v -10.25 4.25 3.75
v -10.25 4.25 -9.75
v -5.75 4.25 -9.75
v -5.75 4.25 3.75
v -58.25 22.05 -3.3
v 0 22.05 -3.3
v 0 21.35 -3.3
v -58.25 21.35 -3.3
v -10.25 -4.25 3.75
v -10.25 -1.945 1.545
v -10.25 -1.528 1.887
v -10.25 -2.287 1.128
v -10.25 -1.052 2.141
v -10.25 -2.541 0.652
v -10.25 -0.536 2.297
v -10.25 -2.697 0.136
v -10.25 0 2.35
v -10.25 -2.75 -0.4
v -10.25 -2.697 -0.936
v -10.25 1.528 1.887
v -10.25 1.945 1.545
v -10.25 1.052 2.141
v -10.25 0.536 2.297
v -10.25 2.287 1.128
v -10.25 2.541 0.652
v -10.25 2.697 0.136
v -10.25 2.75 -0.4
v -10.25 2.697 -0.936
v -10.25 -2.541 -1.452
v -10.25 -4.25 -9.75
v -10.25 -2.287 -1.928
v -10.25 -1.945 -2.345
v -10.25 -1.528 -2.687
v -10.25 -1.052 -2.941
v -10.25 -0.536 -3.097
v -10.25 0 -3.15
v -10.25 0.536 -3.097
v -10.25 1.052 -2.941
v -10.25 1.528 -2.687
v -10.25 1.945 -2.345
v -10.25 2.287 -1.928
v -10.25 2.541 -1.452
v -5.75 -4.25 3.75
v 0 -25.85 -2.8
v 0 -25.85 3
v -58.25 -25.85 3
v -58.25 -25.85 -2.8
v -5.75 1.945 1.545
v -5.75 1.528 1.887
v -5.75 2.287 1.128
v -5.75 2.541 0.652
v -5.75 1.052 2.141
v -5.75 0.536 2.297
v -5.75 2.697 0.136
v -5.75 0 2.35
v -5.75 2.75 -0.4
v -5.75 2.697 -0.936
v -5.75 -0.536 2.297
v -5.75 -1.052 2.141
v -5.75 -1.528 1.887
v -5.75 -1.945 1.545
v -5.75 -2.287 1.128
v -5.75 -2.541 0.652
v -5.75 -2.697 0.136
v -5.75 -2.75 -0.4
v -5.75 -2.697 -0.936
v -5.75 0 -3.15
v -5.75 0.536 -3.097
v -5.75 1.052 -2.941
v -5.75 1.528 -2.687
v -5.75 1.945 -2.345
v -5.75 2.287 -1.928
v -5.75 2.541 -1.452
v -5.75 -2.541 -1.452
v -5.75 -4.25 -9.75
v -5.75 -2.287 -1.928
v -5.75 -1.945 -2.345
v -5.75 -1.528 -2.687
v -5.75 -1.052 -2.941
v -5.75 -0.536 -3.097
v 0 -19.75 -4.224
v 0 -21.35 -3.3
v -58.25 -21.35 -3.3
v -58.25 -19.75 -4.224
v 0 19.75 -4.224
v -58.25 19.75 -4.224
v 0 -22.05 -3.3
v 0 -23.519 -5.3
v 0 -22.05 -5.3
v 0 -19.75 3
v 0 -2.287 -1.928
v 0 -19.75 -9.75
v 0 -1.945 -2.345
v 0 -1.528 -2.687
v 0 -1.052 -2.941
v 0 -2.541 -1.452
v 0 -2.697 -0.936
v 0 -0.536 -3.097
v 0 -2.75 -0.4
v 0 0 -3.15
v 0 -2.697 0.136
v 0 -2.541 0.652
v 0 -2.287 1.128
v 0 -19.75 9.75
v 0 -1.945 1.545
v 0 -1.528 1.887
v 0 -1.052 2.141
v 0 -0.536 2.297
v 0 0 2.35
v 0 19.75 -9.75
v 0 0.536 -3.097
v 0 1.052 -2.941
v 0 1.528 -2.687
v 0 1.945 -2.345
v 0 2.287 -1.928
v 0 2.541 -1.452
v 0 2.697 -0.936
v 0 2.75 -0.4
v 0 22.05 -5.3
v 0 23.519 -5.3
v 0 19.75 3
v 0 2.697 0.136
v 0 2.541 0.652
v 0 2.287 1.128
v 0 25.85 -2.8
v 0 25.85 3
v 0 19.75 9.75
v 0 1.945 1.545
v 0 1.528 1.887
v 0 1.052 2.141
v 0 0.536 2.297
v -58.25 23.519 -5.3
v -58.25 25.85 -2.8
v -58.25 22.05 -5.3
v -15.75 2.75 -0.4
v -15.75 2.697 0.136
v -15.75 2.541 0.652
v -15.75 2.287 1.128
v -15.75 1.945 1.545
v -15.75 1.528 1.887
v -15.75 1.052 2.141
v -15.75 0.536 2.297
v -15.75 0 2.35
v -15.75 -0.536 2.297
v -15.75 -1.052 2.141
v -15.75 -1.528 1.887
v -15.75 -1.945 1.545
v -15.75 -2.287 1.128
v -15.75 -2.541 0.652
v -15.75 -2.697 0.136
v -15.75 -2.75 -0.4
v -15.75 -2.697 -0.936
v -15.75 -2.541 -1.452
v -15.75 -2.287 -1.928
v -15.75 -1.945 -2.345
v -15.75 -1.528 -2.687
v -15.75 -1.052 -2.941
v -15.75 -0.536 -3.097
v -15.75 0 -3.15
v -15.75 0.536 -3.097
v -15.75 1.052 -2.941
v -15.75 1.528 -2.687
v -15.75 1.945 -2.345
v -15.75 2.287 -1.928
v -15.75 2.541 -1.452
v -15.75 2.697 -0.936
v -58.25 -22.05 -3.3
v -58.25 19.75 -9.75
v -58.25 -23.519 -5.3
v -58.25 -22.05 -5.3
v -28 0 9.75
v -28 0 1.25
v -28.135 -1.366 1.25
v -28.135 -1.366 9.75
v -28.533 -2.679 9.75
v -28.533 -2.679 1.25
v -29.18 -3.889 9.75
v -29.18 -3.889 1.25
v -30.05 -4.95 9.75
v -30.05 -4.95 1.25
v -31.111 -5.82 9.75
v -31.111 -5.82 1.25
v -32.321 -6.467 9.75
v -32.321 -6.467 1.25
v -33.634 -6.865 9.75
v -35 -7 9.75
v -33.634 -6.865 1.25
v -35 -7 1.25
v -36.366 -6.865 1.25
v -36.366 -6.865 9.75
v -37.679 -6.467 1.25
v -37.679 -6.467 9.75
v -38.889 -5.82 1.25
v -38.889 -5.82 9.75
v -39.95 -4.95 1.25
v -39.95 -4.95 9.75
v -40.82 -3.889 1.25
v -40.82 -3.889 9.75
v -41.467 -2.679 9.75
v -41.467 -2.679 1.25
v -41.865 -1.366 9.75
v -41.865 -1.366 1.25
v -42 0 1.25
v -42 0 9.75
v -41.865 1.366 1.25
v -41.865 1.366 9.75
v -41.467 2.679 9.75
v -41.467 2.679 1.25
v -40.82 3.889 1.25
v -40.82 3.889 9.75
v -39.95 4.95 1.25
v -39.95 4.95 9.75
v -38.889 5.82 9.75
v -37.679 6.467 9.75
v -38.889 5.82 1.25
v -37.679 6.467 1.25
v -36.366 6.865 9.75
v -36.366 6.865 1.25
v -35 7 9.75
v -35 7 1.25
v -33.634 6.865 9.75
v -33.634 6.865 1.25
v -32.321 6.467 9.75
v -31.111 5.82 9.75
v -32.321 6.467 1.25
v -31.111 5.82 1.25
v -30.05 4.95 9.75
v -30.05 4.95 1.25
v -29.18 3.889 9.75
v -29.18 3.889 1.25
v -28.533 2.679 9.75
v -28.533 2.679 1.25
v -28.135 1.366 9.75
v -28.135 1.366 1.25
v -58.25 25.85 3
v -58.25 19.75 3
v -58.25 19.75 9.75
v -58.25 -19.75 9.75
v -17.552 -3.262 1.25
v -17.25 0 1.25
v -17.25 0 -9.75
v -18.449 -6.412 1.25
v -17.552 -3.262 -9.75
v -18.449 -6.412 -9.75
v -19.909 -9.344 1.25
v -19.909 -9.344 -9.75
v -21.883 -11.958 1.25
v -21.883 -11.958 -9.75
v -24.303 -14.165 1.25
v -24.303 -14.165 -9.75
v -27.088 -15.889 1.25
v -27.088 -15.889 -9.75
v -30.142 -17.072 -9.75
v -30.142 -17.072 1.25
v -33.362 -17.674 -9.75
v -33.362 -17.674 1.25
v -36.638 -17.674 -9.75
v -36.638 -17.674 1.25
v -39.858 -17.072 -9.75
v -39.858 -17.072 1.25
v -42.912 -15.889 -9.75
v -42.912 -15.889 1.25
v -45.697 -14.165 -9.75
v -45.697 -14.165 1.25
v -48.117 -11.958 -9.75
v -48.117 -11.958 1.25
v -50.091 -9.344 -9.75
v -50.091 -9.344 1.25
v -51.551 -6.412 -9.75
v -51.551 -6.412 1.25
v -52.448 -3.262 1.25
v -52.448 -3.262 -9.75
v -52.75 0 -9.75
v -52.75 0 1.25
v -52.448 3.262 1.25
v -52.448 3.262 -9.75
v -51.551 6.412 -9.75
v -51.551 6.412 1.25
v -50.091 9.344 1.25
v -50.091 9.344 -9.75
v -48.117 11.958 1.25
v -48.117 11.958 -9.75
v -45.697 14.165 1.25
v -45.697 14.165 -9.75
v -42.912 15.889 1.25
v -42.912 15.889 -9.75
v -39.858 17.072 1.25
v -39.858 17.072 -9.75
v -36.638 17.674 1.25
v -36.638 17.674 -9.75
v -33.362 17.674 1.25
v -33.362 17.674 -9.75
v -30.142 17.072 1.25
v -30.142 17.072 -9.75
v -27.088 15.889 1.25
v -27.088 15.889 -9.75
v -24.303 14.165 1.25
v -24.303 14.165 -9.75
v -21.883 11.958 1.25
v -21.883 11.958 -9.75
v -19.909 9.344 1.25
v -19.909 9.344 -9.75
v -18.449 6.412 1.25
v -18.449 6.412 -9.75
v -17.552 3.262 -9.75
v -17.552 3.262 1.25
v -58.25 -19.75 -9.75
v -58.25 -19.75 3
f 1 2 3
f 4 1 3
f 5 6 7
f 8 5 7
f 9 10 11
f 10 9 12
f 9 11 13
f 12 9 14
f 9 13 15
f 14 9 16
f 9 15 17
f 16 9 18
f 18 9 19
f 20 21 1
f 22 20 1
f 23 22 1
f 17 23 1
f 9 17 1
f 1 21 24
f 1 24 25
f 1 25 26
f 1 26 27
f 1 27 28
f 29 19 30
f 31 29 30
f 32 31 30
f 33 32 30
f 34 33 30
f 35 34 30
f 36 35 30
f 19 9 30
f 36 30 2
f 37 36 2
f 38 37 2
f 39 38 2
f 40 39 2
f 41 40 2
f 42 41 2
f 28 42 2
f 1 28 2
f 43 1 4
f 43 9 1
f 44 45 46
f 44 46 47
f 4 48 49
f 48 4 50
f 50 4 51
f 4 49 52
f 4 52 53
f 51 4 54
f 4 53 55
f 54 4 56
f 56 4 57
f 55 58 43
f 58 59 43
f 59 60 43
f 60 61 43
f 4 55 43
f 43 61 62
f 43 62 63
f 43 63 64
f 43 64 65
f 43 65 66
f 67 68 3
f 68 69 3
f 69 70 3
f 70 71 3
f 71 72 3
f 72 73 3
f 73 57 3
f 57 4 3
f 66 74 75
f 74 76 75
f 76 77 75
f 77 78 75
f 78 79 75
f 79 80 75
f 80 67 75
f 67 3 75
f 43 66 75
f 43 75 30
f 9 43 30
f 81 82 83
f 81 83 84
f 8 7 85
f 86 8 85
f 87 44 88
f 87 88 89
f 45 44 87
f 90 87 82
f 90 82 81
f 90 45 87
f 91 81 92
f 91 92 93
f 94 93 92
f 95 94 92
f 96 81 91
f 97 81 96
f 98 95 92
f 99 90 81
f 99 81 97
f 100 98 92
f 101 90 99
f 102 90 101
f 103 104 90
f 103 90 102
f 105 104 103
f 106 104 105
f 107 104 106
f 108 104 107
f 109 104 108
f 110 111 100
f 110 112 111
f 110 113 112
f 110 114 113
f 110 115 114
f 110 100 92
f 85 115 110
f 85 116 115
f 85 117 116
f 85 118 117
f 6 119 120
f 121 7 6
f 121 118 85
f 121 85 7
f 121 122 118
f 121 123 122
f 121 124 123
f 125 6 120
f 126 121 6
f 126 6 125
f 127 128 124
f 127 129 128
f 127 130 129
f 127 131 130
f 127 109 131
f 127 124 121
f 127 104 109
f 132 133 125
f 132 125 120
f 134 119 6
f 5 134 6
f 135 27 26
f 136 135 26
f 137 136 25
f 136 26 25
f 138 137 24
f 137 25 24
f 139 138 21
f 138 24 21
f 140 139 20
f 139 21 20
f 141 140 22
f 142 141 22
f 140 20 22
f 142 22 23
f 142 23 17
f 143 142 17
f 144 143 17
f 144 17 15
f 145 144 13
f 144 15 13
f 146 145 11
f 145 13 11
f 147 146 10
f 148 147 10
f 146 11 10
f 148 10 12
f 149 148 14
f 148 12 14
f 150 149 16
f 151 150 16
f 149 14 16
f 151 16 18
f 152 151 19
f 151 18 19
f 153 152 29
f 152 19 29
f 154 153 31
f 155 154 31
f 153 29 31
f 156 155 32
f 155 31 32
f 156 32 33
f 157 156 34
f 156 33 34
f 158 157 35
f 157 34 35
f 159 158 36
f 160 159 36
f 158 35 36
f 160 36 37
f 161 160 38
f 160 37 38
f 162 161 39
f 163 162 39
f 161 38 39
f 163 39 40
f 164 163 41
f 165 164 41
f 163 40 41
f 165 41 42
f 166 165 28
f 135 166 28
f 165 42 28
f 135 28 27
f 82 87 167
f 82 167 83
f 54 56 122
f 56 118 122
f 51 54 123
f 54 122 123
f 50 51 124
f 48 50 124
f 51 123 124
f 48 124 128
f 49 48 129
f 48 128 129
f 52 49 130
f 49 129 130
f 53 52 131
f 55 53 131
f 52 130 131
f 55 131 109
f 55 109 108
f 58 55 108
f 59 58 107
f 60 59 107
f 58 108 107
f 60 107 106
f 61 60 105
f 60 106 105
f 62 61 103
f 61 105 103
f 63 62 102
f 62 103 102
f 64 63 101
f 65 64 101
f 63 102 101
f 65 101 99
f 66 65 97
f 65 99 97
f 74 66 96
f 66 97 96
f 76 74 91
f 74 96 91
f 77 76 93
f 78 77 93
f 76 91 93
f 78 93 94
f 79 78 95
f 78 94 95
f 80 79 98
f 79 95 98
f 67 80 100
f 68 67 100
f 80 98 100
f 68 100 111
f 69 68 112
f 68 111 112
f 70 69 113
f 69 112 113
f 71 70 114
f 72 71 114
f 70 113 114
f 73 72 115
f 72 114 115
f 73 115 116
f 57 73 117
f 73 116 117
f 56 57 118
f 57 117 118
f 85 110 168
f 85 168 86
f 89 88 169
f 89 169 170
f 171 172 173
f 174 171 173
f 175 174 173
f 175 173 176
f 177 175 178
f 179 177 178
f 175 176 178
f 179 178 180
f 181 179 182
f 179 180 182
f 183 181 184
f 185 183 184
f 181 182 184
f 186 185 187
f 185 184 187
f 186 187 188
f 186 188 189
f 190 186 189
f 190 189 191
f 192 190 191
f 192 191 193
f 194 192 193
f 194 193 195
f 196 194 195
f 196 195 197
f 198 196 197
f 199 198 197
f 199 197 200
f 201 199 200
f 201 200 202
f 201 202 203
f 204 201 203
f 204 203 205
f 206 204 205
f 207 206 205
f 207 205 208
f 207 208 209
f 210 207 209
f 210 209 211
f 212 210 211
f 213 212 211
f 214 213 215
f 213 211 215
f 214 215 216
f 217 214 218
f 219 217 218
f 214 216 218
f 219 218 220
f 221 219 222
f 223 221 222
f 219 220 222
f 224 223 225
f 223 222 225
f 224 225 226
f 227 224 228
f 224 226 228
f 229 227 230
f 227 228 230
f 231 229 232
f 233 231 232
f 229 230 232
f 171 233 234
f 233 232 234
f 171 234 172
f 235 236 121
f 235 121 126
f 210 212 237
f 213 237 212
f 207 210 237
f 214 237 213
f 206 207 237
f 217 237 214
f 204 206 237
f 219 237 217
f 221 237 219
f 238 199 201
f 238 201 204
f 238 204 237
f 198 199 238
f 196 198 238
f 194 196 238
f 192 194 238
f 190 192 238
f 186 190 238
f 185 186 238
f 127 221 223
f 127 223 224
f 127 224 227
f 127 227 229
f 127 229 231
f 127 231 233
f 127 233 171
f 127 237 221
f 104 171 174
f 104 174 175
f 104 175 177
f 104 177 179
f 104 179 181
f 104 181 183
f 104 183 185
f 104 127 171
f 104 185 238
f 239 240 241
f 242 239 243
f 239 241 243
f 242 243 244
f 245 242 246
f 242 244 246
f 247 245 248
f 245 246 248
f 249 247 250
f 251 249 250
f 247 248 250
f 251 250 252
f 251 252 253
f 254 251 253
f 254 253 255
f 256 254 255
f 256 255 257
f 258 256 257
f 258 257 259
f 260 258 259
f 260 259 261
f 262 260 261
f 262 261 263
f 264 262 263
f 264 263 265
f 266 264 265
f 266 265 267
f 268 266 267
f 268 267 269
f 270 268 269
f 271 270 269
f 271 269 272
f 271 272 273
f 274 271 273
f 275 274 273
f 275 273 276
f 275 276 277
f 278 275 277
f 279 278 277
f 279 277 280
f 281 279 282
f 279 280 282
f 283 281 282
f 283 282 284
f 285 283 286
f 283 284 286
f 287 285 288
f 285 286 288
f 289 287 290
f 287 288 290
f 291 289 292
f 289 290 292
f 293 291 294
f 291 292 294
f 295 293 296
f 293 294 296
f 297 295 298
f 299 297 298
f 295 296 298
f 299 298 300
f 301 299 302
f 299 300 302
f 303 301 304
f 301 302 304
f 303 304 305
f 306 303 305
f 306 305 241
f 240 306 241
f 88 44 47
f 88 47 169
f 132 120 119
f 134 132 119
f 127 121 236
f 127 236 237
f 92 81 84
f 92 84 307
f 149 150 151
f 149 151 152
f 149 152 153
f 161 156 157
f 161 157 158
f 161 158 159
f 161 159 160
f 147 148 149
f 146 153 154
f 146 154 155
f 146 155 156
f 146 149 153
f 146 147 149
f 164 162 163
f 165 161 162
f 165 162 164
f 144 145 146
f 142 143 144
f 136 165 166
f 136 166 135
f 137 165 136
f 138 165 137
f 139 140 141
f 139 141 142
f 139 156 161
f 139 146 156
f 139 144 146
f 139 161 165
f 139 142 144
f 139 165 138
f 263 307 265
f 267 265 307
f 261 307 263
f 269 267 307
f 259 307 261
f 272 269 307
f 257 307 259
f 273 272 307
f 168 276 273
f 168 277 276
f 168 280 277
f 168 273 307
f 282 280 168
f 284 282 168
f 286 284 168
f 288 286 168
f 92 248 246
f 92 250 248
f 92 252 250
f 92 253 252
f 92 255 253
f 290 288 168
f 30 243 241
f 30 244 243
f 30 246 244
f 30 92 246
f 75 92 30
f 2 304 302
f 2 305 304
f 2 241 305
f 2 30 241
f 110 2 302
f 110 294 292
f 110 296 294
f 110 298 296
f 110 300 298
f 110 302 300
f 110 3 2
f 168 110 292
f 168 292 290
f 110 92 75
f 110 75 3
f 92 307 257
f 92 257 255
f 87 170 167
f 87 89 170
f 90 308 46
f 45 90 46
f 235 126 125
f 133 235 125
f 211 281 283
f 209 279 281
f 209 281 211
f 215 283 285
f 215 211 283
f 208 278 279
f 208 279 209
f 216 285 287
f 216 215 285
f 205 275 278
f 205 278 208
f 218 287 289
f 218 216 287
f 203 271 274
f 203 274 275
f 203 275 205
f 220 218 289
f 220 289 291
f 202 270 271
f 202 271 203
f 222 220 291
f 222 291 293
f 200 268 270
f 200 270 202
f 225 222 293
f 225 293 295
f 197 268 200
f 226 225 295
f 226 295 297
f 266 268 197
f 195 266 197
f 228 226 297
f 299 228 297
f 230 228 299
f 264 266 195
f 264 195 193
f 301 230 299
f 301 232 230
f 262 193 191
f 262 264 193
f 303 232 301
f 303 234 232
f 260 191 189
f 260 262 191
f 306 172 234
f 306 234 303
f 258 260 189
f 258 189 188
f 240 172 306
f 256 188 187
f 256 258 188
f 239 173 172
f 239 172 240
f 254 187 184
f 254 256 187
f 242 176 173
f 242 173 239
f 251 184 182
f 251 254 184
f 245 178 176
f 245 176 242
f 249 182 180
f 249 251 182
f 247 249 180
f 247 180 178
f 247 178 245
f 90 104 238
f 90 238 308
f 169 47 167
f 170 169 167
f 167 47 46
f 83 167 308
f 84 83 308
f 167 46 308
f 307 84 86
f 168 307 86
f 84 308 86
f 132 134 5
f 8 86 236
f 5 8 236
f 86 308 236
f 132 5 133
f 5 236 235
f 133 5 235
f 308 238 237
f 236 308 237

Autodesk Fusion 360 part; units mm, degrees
sketch "Main Profile" plane through (0, 0, 0) normal (1, 0, 0) x (0, 1, 0)
  line L0 (-19.75, -9.75) -> (19.75, -9.75)
  line L1 (19.75, -9.75) -> (19.75, 9.75)
  line L2 (19.75, 9.75) -> (-19.75, 9.75)
  line L3 (-19.75, 9.75) -> (-19.75, -9.75)
  line L4 (-19.75, -9.75) -> (19.75, 9.75) construction
  line L5 (19.75, -9.75) -> (-19.75, 9.75) construction
  line L6 (-19.75, 3) -> (-25.85, 3)
  line L7 (-25.85, 3) -> (-25.85, -2.8)
  line L8 (-25.85, -2.8) -> (-23.5187, -5.3)
  line L9 (-23.5187, -5.3) -> (-22.05, -5.3)
  line L10 (-22.05, -5.3) -> (-22.05, -3.3)
  line L11 (-22.05, -3.3) -> (-21.35, -3.3)
  line L12 (-21.35, -3.3) -> (-19.75, -4.2238)
  line L13 (0, 9.75) -> (0, -9.75) construction
  line L14 (19.75, 3) -> (25.85, 3)
  line L15 (25.85, 3) -> (25.85, -2.8)
  line L16 (25.85, -2.8) -> (23.5187, -5.3)
  line L17 (23.5187, -5.3) -> (22.05, -5.3)
  line L18 (22.05, -5.3) -> (22.05, -3.3)
  line L19 (22.05, -3.3) -> (21.35, -3.3)
  line L20 (21.35, -3.3) -> (19.75, -4.2238)
  circle A0 centre (0, -0.4) radius 2.75
  dimension "d1" = 39.5
  dimension "d2" = 19.5
  dimension "d3" = 6.1
  dimension "d4" = 6.75
  dimension "d5" = 8.3
  dimension "d6" = 43
  dimension "d7" = 2.5
  dimension "d8" = 120
  dimension "d9" = 3.8
  dimension "d10" = 2
  dimension "d11" = 1.6
  dimension "d12" = 5.5
  dimension "d13" = 0.4
extrude "Extrude1" add sketch "Main Profile" against normal blind 58.25 contours L0 L1 L2 L3 | L3 L6 L7 L8 L9 L10 L11 L12 | L1 L14 L15 L16 L17 L18 L19 L20 | A0
sketch "Side" plane through (0, 0, -9.75) normal (0, 0, -1) x (1, 0, 0)
  line L0 (0, -19.75) -> (0, 19.75)
  line L1 (0, 19.75) -> (-58.25, 19.75)
  line L2 (-58.25, 19.75) -> (-58.25, -19.75)
  line L3 (-58.25, -19.75) -> (0, -19.75)
  circle A0 centre (-35, 0) radius 17.75
  circle A1 centre (-35, 0) radius 7
  line L4 (-10.25, -4.25) -> (-5.75, -4.25)
  line L5 (-5.75, -4.25) -> (-5.75, 4.25)
  line L6 (-5.75, 4.25) -> (-10.25, 4.25)
  line L7 (-10.25, 4.25) -> (-10.25, -4.25)
  line L8 (-10.25, -4.25) -> (-5.75, 4.25) construction
  line L9 (-5.75, -4.25) -> (-10.25, 4.25) construction
  point P0 (-8, 0)
  dimension "d16" = 35.5
  dimension "d17" = 35
  dimension "d18" = 14
  dimension "d19" = 8.5
  dimension "d20" = 4.5
  dimension "d21" = 5.75
extrude "Extrude2" cut sketch "Side" against normal blind 13.5 contours L4 L5 L6 L7
extrude "Extrude3" cut sketch "Side" against normal blind 40 contours A1
extrude "Extrude4" cut sketch "Side" against normal blind 10.85 contours A0
extrude "Extrude5" cut sketch "Main Profile" against normal blind 15.75 contours A0
extrude "Extrude6" cut 1 faces at (-20.8994, 0.8818, 1.1) along direction (0, 0, 1) blind 0.15
